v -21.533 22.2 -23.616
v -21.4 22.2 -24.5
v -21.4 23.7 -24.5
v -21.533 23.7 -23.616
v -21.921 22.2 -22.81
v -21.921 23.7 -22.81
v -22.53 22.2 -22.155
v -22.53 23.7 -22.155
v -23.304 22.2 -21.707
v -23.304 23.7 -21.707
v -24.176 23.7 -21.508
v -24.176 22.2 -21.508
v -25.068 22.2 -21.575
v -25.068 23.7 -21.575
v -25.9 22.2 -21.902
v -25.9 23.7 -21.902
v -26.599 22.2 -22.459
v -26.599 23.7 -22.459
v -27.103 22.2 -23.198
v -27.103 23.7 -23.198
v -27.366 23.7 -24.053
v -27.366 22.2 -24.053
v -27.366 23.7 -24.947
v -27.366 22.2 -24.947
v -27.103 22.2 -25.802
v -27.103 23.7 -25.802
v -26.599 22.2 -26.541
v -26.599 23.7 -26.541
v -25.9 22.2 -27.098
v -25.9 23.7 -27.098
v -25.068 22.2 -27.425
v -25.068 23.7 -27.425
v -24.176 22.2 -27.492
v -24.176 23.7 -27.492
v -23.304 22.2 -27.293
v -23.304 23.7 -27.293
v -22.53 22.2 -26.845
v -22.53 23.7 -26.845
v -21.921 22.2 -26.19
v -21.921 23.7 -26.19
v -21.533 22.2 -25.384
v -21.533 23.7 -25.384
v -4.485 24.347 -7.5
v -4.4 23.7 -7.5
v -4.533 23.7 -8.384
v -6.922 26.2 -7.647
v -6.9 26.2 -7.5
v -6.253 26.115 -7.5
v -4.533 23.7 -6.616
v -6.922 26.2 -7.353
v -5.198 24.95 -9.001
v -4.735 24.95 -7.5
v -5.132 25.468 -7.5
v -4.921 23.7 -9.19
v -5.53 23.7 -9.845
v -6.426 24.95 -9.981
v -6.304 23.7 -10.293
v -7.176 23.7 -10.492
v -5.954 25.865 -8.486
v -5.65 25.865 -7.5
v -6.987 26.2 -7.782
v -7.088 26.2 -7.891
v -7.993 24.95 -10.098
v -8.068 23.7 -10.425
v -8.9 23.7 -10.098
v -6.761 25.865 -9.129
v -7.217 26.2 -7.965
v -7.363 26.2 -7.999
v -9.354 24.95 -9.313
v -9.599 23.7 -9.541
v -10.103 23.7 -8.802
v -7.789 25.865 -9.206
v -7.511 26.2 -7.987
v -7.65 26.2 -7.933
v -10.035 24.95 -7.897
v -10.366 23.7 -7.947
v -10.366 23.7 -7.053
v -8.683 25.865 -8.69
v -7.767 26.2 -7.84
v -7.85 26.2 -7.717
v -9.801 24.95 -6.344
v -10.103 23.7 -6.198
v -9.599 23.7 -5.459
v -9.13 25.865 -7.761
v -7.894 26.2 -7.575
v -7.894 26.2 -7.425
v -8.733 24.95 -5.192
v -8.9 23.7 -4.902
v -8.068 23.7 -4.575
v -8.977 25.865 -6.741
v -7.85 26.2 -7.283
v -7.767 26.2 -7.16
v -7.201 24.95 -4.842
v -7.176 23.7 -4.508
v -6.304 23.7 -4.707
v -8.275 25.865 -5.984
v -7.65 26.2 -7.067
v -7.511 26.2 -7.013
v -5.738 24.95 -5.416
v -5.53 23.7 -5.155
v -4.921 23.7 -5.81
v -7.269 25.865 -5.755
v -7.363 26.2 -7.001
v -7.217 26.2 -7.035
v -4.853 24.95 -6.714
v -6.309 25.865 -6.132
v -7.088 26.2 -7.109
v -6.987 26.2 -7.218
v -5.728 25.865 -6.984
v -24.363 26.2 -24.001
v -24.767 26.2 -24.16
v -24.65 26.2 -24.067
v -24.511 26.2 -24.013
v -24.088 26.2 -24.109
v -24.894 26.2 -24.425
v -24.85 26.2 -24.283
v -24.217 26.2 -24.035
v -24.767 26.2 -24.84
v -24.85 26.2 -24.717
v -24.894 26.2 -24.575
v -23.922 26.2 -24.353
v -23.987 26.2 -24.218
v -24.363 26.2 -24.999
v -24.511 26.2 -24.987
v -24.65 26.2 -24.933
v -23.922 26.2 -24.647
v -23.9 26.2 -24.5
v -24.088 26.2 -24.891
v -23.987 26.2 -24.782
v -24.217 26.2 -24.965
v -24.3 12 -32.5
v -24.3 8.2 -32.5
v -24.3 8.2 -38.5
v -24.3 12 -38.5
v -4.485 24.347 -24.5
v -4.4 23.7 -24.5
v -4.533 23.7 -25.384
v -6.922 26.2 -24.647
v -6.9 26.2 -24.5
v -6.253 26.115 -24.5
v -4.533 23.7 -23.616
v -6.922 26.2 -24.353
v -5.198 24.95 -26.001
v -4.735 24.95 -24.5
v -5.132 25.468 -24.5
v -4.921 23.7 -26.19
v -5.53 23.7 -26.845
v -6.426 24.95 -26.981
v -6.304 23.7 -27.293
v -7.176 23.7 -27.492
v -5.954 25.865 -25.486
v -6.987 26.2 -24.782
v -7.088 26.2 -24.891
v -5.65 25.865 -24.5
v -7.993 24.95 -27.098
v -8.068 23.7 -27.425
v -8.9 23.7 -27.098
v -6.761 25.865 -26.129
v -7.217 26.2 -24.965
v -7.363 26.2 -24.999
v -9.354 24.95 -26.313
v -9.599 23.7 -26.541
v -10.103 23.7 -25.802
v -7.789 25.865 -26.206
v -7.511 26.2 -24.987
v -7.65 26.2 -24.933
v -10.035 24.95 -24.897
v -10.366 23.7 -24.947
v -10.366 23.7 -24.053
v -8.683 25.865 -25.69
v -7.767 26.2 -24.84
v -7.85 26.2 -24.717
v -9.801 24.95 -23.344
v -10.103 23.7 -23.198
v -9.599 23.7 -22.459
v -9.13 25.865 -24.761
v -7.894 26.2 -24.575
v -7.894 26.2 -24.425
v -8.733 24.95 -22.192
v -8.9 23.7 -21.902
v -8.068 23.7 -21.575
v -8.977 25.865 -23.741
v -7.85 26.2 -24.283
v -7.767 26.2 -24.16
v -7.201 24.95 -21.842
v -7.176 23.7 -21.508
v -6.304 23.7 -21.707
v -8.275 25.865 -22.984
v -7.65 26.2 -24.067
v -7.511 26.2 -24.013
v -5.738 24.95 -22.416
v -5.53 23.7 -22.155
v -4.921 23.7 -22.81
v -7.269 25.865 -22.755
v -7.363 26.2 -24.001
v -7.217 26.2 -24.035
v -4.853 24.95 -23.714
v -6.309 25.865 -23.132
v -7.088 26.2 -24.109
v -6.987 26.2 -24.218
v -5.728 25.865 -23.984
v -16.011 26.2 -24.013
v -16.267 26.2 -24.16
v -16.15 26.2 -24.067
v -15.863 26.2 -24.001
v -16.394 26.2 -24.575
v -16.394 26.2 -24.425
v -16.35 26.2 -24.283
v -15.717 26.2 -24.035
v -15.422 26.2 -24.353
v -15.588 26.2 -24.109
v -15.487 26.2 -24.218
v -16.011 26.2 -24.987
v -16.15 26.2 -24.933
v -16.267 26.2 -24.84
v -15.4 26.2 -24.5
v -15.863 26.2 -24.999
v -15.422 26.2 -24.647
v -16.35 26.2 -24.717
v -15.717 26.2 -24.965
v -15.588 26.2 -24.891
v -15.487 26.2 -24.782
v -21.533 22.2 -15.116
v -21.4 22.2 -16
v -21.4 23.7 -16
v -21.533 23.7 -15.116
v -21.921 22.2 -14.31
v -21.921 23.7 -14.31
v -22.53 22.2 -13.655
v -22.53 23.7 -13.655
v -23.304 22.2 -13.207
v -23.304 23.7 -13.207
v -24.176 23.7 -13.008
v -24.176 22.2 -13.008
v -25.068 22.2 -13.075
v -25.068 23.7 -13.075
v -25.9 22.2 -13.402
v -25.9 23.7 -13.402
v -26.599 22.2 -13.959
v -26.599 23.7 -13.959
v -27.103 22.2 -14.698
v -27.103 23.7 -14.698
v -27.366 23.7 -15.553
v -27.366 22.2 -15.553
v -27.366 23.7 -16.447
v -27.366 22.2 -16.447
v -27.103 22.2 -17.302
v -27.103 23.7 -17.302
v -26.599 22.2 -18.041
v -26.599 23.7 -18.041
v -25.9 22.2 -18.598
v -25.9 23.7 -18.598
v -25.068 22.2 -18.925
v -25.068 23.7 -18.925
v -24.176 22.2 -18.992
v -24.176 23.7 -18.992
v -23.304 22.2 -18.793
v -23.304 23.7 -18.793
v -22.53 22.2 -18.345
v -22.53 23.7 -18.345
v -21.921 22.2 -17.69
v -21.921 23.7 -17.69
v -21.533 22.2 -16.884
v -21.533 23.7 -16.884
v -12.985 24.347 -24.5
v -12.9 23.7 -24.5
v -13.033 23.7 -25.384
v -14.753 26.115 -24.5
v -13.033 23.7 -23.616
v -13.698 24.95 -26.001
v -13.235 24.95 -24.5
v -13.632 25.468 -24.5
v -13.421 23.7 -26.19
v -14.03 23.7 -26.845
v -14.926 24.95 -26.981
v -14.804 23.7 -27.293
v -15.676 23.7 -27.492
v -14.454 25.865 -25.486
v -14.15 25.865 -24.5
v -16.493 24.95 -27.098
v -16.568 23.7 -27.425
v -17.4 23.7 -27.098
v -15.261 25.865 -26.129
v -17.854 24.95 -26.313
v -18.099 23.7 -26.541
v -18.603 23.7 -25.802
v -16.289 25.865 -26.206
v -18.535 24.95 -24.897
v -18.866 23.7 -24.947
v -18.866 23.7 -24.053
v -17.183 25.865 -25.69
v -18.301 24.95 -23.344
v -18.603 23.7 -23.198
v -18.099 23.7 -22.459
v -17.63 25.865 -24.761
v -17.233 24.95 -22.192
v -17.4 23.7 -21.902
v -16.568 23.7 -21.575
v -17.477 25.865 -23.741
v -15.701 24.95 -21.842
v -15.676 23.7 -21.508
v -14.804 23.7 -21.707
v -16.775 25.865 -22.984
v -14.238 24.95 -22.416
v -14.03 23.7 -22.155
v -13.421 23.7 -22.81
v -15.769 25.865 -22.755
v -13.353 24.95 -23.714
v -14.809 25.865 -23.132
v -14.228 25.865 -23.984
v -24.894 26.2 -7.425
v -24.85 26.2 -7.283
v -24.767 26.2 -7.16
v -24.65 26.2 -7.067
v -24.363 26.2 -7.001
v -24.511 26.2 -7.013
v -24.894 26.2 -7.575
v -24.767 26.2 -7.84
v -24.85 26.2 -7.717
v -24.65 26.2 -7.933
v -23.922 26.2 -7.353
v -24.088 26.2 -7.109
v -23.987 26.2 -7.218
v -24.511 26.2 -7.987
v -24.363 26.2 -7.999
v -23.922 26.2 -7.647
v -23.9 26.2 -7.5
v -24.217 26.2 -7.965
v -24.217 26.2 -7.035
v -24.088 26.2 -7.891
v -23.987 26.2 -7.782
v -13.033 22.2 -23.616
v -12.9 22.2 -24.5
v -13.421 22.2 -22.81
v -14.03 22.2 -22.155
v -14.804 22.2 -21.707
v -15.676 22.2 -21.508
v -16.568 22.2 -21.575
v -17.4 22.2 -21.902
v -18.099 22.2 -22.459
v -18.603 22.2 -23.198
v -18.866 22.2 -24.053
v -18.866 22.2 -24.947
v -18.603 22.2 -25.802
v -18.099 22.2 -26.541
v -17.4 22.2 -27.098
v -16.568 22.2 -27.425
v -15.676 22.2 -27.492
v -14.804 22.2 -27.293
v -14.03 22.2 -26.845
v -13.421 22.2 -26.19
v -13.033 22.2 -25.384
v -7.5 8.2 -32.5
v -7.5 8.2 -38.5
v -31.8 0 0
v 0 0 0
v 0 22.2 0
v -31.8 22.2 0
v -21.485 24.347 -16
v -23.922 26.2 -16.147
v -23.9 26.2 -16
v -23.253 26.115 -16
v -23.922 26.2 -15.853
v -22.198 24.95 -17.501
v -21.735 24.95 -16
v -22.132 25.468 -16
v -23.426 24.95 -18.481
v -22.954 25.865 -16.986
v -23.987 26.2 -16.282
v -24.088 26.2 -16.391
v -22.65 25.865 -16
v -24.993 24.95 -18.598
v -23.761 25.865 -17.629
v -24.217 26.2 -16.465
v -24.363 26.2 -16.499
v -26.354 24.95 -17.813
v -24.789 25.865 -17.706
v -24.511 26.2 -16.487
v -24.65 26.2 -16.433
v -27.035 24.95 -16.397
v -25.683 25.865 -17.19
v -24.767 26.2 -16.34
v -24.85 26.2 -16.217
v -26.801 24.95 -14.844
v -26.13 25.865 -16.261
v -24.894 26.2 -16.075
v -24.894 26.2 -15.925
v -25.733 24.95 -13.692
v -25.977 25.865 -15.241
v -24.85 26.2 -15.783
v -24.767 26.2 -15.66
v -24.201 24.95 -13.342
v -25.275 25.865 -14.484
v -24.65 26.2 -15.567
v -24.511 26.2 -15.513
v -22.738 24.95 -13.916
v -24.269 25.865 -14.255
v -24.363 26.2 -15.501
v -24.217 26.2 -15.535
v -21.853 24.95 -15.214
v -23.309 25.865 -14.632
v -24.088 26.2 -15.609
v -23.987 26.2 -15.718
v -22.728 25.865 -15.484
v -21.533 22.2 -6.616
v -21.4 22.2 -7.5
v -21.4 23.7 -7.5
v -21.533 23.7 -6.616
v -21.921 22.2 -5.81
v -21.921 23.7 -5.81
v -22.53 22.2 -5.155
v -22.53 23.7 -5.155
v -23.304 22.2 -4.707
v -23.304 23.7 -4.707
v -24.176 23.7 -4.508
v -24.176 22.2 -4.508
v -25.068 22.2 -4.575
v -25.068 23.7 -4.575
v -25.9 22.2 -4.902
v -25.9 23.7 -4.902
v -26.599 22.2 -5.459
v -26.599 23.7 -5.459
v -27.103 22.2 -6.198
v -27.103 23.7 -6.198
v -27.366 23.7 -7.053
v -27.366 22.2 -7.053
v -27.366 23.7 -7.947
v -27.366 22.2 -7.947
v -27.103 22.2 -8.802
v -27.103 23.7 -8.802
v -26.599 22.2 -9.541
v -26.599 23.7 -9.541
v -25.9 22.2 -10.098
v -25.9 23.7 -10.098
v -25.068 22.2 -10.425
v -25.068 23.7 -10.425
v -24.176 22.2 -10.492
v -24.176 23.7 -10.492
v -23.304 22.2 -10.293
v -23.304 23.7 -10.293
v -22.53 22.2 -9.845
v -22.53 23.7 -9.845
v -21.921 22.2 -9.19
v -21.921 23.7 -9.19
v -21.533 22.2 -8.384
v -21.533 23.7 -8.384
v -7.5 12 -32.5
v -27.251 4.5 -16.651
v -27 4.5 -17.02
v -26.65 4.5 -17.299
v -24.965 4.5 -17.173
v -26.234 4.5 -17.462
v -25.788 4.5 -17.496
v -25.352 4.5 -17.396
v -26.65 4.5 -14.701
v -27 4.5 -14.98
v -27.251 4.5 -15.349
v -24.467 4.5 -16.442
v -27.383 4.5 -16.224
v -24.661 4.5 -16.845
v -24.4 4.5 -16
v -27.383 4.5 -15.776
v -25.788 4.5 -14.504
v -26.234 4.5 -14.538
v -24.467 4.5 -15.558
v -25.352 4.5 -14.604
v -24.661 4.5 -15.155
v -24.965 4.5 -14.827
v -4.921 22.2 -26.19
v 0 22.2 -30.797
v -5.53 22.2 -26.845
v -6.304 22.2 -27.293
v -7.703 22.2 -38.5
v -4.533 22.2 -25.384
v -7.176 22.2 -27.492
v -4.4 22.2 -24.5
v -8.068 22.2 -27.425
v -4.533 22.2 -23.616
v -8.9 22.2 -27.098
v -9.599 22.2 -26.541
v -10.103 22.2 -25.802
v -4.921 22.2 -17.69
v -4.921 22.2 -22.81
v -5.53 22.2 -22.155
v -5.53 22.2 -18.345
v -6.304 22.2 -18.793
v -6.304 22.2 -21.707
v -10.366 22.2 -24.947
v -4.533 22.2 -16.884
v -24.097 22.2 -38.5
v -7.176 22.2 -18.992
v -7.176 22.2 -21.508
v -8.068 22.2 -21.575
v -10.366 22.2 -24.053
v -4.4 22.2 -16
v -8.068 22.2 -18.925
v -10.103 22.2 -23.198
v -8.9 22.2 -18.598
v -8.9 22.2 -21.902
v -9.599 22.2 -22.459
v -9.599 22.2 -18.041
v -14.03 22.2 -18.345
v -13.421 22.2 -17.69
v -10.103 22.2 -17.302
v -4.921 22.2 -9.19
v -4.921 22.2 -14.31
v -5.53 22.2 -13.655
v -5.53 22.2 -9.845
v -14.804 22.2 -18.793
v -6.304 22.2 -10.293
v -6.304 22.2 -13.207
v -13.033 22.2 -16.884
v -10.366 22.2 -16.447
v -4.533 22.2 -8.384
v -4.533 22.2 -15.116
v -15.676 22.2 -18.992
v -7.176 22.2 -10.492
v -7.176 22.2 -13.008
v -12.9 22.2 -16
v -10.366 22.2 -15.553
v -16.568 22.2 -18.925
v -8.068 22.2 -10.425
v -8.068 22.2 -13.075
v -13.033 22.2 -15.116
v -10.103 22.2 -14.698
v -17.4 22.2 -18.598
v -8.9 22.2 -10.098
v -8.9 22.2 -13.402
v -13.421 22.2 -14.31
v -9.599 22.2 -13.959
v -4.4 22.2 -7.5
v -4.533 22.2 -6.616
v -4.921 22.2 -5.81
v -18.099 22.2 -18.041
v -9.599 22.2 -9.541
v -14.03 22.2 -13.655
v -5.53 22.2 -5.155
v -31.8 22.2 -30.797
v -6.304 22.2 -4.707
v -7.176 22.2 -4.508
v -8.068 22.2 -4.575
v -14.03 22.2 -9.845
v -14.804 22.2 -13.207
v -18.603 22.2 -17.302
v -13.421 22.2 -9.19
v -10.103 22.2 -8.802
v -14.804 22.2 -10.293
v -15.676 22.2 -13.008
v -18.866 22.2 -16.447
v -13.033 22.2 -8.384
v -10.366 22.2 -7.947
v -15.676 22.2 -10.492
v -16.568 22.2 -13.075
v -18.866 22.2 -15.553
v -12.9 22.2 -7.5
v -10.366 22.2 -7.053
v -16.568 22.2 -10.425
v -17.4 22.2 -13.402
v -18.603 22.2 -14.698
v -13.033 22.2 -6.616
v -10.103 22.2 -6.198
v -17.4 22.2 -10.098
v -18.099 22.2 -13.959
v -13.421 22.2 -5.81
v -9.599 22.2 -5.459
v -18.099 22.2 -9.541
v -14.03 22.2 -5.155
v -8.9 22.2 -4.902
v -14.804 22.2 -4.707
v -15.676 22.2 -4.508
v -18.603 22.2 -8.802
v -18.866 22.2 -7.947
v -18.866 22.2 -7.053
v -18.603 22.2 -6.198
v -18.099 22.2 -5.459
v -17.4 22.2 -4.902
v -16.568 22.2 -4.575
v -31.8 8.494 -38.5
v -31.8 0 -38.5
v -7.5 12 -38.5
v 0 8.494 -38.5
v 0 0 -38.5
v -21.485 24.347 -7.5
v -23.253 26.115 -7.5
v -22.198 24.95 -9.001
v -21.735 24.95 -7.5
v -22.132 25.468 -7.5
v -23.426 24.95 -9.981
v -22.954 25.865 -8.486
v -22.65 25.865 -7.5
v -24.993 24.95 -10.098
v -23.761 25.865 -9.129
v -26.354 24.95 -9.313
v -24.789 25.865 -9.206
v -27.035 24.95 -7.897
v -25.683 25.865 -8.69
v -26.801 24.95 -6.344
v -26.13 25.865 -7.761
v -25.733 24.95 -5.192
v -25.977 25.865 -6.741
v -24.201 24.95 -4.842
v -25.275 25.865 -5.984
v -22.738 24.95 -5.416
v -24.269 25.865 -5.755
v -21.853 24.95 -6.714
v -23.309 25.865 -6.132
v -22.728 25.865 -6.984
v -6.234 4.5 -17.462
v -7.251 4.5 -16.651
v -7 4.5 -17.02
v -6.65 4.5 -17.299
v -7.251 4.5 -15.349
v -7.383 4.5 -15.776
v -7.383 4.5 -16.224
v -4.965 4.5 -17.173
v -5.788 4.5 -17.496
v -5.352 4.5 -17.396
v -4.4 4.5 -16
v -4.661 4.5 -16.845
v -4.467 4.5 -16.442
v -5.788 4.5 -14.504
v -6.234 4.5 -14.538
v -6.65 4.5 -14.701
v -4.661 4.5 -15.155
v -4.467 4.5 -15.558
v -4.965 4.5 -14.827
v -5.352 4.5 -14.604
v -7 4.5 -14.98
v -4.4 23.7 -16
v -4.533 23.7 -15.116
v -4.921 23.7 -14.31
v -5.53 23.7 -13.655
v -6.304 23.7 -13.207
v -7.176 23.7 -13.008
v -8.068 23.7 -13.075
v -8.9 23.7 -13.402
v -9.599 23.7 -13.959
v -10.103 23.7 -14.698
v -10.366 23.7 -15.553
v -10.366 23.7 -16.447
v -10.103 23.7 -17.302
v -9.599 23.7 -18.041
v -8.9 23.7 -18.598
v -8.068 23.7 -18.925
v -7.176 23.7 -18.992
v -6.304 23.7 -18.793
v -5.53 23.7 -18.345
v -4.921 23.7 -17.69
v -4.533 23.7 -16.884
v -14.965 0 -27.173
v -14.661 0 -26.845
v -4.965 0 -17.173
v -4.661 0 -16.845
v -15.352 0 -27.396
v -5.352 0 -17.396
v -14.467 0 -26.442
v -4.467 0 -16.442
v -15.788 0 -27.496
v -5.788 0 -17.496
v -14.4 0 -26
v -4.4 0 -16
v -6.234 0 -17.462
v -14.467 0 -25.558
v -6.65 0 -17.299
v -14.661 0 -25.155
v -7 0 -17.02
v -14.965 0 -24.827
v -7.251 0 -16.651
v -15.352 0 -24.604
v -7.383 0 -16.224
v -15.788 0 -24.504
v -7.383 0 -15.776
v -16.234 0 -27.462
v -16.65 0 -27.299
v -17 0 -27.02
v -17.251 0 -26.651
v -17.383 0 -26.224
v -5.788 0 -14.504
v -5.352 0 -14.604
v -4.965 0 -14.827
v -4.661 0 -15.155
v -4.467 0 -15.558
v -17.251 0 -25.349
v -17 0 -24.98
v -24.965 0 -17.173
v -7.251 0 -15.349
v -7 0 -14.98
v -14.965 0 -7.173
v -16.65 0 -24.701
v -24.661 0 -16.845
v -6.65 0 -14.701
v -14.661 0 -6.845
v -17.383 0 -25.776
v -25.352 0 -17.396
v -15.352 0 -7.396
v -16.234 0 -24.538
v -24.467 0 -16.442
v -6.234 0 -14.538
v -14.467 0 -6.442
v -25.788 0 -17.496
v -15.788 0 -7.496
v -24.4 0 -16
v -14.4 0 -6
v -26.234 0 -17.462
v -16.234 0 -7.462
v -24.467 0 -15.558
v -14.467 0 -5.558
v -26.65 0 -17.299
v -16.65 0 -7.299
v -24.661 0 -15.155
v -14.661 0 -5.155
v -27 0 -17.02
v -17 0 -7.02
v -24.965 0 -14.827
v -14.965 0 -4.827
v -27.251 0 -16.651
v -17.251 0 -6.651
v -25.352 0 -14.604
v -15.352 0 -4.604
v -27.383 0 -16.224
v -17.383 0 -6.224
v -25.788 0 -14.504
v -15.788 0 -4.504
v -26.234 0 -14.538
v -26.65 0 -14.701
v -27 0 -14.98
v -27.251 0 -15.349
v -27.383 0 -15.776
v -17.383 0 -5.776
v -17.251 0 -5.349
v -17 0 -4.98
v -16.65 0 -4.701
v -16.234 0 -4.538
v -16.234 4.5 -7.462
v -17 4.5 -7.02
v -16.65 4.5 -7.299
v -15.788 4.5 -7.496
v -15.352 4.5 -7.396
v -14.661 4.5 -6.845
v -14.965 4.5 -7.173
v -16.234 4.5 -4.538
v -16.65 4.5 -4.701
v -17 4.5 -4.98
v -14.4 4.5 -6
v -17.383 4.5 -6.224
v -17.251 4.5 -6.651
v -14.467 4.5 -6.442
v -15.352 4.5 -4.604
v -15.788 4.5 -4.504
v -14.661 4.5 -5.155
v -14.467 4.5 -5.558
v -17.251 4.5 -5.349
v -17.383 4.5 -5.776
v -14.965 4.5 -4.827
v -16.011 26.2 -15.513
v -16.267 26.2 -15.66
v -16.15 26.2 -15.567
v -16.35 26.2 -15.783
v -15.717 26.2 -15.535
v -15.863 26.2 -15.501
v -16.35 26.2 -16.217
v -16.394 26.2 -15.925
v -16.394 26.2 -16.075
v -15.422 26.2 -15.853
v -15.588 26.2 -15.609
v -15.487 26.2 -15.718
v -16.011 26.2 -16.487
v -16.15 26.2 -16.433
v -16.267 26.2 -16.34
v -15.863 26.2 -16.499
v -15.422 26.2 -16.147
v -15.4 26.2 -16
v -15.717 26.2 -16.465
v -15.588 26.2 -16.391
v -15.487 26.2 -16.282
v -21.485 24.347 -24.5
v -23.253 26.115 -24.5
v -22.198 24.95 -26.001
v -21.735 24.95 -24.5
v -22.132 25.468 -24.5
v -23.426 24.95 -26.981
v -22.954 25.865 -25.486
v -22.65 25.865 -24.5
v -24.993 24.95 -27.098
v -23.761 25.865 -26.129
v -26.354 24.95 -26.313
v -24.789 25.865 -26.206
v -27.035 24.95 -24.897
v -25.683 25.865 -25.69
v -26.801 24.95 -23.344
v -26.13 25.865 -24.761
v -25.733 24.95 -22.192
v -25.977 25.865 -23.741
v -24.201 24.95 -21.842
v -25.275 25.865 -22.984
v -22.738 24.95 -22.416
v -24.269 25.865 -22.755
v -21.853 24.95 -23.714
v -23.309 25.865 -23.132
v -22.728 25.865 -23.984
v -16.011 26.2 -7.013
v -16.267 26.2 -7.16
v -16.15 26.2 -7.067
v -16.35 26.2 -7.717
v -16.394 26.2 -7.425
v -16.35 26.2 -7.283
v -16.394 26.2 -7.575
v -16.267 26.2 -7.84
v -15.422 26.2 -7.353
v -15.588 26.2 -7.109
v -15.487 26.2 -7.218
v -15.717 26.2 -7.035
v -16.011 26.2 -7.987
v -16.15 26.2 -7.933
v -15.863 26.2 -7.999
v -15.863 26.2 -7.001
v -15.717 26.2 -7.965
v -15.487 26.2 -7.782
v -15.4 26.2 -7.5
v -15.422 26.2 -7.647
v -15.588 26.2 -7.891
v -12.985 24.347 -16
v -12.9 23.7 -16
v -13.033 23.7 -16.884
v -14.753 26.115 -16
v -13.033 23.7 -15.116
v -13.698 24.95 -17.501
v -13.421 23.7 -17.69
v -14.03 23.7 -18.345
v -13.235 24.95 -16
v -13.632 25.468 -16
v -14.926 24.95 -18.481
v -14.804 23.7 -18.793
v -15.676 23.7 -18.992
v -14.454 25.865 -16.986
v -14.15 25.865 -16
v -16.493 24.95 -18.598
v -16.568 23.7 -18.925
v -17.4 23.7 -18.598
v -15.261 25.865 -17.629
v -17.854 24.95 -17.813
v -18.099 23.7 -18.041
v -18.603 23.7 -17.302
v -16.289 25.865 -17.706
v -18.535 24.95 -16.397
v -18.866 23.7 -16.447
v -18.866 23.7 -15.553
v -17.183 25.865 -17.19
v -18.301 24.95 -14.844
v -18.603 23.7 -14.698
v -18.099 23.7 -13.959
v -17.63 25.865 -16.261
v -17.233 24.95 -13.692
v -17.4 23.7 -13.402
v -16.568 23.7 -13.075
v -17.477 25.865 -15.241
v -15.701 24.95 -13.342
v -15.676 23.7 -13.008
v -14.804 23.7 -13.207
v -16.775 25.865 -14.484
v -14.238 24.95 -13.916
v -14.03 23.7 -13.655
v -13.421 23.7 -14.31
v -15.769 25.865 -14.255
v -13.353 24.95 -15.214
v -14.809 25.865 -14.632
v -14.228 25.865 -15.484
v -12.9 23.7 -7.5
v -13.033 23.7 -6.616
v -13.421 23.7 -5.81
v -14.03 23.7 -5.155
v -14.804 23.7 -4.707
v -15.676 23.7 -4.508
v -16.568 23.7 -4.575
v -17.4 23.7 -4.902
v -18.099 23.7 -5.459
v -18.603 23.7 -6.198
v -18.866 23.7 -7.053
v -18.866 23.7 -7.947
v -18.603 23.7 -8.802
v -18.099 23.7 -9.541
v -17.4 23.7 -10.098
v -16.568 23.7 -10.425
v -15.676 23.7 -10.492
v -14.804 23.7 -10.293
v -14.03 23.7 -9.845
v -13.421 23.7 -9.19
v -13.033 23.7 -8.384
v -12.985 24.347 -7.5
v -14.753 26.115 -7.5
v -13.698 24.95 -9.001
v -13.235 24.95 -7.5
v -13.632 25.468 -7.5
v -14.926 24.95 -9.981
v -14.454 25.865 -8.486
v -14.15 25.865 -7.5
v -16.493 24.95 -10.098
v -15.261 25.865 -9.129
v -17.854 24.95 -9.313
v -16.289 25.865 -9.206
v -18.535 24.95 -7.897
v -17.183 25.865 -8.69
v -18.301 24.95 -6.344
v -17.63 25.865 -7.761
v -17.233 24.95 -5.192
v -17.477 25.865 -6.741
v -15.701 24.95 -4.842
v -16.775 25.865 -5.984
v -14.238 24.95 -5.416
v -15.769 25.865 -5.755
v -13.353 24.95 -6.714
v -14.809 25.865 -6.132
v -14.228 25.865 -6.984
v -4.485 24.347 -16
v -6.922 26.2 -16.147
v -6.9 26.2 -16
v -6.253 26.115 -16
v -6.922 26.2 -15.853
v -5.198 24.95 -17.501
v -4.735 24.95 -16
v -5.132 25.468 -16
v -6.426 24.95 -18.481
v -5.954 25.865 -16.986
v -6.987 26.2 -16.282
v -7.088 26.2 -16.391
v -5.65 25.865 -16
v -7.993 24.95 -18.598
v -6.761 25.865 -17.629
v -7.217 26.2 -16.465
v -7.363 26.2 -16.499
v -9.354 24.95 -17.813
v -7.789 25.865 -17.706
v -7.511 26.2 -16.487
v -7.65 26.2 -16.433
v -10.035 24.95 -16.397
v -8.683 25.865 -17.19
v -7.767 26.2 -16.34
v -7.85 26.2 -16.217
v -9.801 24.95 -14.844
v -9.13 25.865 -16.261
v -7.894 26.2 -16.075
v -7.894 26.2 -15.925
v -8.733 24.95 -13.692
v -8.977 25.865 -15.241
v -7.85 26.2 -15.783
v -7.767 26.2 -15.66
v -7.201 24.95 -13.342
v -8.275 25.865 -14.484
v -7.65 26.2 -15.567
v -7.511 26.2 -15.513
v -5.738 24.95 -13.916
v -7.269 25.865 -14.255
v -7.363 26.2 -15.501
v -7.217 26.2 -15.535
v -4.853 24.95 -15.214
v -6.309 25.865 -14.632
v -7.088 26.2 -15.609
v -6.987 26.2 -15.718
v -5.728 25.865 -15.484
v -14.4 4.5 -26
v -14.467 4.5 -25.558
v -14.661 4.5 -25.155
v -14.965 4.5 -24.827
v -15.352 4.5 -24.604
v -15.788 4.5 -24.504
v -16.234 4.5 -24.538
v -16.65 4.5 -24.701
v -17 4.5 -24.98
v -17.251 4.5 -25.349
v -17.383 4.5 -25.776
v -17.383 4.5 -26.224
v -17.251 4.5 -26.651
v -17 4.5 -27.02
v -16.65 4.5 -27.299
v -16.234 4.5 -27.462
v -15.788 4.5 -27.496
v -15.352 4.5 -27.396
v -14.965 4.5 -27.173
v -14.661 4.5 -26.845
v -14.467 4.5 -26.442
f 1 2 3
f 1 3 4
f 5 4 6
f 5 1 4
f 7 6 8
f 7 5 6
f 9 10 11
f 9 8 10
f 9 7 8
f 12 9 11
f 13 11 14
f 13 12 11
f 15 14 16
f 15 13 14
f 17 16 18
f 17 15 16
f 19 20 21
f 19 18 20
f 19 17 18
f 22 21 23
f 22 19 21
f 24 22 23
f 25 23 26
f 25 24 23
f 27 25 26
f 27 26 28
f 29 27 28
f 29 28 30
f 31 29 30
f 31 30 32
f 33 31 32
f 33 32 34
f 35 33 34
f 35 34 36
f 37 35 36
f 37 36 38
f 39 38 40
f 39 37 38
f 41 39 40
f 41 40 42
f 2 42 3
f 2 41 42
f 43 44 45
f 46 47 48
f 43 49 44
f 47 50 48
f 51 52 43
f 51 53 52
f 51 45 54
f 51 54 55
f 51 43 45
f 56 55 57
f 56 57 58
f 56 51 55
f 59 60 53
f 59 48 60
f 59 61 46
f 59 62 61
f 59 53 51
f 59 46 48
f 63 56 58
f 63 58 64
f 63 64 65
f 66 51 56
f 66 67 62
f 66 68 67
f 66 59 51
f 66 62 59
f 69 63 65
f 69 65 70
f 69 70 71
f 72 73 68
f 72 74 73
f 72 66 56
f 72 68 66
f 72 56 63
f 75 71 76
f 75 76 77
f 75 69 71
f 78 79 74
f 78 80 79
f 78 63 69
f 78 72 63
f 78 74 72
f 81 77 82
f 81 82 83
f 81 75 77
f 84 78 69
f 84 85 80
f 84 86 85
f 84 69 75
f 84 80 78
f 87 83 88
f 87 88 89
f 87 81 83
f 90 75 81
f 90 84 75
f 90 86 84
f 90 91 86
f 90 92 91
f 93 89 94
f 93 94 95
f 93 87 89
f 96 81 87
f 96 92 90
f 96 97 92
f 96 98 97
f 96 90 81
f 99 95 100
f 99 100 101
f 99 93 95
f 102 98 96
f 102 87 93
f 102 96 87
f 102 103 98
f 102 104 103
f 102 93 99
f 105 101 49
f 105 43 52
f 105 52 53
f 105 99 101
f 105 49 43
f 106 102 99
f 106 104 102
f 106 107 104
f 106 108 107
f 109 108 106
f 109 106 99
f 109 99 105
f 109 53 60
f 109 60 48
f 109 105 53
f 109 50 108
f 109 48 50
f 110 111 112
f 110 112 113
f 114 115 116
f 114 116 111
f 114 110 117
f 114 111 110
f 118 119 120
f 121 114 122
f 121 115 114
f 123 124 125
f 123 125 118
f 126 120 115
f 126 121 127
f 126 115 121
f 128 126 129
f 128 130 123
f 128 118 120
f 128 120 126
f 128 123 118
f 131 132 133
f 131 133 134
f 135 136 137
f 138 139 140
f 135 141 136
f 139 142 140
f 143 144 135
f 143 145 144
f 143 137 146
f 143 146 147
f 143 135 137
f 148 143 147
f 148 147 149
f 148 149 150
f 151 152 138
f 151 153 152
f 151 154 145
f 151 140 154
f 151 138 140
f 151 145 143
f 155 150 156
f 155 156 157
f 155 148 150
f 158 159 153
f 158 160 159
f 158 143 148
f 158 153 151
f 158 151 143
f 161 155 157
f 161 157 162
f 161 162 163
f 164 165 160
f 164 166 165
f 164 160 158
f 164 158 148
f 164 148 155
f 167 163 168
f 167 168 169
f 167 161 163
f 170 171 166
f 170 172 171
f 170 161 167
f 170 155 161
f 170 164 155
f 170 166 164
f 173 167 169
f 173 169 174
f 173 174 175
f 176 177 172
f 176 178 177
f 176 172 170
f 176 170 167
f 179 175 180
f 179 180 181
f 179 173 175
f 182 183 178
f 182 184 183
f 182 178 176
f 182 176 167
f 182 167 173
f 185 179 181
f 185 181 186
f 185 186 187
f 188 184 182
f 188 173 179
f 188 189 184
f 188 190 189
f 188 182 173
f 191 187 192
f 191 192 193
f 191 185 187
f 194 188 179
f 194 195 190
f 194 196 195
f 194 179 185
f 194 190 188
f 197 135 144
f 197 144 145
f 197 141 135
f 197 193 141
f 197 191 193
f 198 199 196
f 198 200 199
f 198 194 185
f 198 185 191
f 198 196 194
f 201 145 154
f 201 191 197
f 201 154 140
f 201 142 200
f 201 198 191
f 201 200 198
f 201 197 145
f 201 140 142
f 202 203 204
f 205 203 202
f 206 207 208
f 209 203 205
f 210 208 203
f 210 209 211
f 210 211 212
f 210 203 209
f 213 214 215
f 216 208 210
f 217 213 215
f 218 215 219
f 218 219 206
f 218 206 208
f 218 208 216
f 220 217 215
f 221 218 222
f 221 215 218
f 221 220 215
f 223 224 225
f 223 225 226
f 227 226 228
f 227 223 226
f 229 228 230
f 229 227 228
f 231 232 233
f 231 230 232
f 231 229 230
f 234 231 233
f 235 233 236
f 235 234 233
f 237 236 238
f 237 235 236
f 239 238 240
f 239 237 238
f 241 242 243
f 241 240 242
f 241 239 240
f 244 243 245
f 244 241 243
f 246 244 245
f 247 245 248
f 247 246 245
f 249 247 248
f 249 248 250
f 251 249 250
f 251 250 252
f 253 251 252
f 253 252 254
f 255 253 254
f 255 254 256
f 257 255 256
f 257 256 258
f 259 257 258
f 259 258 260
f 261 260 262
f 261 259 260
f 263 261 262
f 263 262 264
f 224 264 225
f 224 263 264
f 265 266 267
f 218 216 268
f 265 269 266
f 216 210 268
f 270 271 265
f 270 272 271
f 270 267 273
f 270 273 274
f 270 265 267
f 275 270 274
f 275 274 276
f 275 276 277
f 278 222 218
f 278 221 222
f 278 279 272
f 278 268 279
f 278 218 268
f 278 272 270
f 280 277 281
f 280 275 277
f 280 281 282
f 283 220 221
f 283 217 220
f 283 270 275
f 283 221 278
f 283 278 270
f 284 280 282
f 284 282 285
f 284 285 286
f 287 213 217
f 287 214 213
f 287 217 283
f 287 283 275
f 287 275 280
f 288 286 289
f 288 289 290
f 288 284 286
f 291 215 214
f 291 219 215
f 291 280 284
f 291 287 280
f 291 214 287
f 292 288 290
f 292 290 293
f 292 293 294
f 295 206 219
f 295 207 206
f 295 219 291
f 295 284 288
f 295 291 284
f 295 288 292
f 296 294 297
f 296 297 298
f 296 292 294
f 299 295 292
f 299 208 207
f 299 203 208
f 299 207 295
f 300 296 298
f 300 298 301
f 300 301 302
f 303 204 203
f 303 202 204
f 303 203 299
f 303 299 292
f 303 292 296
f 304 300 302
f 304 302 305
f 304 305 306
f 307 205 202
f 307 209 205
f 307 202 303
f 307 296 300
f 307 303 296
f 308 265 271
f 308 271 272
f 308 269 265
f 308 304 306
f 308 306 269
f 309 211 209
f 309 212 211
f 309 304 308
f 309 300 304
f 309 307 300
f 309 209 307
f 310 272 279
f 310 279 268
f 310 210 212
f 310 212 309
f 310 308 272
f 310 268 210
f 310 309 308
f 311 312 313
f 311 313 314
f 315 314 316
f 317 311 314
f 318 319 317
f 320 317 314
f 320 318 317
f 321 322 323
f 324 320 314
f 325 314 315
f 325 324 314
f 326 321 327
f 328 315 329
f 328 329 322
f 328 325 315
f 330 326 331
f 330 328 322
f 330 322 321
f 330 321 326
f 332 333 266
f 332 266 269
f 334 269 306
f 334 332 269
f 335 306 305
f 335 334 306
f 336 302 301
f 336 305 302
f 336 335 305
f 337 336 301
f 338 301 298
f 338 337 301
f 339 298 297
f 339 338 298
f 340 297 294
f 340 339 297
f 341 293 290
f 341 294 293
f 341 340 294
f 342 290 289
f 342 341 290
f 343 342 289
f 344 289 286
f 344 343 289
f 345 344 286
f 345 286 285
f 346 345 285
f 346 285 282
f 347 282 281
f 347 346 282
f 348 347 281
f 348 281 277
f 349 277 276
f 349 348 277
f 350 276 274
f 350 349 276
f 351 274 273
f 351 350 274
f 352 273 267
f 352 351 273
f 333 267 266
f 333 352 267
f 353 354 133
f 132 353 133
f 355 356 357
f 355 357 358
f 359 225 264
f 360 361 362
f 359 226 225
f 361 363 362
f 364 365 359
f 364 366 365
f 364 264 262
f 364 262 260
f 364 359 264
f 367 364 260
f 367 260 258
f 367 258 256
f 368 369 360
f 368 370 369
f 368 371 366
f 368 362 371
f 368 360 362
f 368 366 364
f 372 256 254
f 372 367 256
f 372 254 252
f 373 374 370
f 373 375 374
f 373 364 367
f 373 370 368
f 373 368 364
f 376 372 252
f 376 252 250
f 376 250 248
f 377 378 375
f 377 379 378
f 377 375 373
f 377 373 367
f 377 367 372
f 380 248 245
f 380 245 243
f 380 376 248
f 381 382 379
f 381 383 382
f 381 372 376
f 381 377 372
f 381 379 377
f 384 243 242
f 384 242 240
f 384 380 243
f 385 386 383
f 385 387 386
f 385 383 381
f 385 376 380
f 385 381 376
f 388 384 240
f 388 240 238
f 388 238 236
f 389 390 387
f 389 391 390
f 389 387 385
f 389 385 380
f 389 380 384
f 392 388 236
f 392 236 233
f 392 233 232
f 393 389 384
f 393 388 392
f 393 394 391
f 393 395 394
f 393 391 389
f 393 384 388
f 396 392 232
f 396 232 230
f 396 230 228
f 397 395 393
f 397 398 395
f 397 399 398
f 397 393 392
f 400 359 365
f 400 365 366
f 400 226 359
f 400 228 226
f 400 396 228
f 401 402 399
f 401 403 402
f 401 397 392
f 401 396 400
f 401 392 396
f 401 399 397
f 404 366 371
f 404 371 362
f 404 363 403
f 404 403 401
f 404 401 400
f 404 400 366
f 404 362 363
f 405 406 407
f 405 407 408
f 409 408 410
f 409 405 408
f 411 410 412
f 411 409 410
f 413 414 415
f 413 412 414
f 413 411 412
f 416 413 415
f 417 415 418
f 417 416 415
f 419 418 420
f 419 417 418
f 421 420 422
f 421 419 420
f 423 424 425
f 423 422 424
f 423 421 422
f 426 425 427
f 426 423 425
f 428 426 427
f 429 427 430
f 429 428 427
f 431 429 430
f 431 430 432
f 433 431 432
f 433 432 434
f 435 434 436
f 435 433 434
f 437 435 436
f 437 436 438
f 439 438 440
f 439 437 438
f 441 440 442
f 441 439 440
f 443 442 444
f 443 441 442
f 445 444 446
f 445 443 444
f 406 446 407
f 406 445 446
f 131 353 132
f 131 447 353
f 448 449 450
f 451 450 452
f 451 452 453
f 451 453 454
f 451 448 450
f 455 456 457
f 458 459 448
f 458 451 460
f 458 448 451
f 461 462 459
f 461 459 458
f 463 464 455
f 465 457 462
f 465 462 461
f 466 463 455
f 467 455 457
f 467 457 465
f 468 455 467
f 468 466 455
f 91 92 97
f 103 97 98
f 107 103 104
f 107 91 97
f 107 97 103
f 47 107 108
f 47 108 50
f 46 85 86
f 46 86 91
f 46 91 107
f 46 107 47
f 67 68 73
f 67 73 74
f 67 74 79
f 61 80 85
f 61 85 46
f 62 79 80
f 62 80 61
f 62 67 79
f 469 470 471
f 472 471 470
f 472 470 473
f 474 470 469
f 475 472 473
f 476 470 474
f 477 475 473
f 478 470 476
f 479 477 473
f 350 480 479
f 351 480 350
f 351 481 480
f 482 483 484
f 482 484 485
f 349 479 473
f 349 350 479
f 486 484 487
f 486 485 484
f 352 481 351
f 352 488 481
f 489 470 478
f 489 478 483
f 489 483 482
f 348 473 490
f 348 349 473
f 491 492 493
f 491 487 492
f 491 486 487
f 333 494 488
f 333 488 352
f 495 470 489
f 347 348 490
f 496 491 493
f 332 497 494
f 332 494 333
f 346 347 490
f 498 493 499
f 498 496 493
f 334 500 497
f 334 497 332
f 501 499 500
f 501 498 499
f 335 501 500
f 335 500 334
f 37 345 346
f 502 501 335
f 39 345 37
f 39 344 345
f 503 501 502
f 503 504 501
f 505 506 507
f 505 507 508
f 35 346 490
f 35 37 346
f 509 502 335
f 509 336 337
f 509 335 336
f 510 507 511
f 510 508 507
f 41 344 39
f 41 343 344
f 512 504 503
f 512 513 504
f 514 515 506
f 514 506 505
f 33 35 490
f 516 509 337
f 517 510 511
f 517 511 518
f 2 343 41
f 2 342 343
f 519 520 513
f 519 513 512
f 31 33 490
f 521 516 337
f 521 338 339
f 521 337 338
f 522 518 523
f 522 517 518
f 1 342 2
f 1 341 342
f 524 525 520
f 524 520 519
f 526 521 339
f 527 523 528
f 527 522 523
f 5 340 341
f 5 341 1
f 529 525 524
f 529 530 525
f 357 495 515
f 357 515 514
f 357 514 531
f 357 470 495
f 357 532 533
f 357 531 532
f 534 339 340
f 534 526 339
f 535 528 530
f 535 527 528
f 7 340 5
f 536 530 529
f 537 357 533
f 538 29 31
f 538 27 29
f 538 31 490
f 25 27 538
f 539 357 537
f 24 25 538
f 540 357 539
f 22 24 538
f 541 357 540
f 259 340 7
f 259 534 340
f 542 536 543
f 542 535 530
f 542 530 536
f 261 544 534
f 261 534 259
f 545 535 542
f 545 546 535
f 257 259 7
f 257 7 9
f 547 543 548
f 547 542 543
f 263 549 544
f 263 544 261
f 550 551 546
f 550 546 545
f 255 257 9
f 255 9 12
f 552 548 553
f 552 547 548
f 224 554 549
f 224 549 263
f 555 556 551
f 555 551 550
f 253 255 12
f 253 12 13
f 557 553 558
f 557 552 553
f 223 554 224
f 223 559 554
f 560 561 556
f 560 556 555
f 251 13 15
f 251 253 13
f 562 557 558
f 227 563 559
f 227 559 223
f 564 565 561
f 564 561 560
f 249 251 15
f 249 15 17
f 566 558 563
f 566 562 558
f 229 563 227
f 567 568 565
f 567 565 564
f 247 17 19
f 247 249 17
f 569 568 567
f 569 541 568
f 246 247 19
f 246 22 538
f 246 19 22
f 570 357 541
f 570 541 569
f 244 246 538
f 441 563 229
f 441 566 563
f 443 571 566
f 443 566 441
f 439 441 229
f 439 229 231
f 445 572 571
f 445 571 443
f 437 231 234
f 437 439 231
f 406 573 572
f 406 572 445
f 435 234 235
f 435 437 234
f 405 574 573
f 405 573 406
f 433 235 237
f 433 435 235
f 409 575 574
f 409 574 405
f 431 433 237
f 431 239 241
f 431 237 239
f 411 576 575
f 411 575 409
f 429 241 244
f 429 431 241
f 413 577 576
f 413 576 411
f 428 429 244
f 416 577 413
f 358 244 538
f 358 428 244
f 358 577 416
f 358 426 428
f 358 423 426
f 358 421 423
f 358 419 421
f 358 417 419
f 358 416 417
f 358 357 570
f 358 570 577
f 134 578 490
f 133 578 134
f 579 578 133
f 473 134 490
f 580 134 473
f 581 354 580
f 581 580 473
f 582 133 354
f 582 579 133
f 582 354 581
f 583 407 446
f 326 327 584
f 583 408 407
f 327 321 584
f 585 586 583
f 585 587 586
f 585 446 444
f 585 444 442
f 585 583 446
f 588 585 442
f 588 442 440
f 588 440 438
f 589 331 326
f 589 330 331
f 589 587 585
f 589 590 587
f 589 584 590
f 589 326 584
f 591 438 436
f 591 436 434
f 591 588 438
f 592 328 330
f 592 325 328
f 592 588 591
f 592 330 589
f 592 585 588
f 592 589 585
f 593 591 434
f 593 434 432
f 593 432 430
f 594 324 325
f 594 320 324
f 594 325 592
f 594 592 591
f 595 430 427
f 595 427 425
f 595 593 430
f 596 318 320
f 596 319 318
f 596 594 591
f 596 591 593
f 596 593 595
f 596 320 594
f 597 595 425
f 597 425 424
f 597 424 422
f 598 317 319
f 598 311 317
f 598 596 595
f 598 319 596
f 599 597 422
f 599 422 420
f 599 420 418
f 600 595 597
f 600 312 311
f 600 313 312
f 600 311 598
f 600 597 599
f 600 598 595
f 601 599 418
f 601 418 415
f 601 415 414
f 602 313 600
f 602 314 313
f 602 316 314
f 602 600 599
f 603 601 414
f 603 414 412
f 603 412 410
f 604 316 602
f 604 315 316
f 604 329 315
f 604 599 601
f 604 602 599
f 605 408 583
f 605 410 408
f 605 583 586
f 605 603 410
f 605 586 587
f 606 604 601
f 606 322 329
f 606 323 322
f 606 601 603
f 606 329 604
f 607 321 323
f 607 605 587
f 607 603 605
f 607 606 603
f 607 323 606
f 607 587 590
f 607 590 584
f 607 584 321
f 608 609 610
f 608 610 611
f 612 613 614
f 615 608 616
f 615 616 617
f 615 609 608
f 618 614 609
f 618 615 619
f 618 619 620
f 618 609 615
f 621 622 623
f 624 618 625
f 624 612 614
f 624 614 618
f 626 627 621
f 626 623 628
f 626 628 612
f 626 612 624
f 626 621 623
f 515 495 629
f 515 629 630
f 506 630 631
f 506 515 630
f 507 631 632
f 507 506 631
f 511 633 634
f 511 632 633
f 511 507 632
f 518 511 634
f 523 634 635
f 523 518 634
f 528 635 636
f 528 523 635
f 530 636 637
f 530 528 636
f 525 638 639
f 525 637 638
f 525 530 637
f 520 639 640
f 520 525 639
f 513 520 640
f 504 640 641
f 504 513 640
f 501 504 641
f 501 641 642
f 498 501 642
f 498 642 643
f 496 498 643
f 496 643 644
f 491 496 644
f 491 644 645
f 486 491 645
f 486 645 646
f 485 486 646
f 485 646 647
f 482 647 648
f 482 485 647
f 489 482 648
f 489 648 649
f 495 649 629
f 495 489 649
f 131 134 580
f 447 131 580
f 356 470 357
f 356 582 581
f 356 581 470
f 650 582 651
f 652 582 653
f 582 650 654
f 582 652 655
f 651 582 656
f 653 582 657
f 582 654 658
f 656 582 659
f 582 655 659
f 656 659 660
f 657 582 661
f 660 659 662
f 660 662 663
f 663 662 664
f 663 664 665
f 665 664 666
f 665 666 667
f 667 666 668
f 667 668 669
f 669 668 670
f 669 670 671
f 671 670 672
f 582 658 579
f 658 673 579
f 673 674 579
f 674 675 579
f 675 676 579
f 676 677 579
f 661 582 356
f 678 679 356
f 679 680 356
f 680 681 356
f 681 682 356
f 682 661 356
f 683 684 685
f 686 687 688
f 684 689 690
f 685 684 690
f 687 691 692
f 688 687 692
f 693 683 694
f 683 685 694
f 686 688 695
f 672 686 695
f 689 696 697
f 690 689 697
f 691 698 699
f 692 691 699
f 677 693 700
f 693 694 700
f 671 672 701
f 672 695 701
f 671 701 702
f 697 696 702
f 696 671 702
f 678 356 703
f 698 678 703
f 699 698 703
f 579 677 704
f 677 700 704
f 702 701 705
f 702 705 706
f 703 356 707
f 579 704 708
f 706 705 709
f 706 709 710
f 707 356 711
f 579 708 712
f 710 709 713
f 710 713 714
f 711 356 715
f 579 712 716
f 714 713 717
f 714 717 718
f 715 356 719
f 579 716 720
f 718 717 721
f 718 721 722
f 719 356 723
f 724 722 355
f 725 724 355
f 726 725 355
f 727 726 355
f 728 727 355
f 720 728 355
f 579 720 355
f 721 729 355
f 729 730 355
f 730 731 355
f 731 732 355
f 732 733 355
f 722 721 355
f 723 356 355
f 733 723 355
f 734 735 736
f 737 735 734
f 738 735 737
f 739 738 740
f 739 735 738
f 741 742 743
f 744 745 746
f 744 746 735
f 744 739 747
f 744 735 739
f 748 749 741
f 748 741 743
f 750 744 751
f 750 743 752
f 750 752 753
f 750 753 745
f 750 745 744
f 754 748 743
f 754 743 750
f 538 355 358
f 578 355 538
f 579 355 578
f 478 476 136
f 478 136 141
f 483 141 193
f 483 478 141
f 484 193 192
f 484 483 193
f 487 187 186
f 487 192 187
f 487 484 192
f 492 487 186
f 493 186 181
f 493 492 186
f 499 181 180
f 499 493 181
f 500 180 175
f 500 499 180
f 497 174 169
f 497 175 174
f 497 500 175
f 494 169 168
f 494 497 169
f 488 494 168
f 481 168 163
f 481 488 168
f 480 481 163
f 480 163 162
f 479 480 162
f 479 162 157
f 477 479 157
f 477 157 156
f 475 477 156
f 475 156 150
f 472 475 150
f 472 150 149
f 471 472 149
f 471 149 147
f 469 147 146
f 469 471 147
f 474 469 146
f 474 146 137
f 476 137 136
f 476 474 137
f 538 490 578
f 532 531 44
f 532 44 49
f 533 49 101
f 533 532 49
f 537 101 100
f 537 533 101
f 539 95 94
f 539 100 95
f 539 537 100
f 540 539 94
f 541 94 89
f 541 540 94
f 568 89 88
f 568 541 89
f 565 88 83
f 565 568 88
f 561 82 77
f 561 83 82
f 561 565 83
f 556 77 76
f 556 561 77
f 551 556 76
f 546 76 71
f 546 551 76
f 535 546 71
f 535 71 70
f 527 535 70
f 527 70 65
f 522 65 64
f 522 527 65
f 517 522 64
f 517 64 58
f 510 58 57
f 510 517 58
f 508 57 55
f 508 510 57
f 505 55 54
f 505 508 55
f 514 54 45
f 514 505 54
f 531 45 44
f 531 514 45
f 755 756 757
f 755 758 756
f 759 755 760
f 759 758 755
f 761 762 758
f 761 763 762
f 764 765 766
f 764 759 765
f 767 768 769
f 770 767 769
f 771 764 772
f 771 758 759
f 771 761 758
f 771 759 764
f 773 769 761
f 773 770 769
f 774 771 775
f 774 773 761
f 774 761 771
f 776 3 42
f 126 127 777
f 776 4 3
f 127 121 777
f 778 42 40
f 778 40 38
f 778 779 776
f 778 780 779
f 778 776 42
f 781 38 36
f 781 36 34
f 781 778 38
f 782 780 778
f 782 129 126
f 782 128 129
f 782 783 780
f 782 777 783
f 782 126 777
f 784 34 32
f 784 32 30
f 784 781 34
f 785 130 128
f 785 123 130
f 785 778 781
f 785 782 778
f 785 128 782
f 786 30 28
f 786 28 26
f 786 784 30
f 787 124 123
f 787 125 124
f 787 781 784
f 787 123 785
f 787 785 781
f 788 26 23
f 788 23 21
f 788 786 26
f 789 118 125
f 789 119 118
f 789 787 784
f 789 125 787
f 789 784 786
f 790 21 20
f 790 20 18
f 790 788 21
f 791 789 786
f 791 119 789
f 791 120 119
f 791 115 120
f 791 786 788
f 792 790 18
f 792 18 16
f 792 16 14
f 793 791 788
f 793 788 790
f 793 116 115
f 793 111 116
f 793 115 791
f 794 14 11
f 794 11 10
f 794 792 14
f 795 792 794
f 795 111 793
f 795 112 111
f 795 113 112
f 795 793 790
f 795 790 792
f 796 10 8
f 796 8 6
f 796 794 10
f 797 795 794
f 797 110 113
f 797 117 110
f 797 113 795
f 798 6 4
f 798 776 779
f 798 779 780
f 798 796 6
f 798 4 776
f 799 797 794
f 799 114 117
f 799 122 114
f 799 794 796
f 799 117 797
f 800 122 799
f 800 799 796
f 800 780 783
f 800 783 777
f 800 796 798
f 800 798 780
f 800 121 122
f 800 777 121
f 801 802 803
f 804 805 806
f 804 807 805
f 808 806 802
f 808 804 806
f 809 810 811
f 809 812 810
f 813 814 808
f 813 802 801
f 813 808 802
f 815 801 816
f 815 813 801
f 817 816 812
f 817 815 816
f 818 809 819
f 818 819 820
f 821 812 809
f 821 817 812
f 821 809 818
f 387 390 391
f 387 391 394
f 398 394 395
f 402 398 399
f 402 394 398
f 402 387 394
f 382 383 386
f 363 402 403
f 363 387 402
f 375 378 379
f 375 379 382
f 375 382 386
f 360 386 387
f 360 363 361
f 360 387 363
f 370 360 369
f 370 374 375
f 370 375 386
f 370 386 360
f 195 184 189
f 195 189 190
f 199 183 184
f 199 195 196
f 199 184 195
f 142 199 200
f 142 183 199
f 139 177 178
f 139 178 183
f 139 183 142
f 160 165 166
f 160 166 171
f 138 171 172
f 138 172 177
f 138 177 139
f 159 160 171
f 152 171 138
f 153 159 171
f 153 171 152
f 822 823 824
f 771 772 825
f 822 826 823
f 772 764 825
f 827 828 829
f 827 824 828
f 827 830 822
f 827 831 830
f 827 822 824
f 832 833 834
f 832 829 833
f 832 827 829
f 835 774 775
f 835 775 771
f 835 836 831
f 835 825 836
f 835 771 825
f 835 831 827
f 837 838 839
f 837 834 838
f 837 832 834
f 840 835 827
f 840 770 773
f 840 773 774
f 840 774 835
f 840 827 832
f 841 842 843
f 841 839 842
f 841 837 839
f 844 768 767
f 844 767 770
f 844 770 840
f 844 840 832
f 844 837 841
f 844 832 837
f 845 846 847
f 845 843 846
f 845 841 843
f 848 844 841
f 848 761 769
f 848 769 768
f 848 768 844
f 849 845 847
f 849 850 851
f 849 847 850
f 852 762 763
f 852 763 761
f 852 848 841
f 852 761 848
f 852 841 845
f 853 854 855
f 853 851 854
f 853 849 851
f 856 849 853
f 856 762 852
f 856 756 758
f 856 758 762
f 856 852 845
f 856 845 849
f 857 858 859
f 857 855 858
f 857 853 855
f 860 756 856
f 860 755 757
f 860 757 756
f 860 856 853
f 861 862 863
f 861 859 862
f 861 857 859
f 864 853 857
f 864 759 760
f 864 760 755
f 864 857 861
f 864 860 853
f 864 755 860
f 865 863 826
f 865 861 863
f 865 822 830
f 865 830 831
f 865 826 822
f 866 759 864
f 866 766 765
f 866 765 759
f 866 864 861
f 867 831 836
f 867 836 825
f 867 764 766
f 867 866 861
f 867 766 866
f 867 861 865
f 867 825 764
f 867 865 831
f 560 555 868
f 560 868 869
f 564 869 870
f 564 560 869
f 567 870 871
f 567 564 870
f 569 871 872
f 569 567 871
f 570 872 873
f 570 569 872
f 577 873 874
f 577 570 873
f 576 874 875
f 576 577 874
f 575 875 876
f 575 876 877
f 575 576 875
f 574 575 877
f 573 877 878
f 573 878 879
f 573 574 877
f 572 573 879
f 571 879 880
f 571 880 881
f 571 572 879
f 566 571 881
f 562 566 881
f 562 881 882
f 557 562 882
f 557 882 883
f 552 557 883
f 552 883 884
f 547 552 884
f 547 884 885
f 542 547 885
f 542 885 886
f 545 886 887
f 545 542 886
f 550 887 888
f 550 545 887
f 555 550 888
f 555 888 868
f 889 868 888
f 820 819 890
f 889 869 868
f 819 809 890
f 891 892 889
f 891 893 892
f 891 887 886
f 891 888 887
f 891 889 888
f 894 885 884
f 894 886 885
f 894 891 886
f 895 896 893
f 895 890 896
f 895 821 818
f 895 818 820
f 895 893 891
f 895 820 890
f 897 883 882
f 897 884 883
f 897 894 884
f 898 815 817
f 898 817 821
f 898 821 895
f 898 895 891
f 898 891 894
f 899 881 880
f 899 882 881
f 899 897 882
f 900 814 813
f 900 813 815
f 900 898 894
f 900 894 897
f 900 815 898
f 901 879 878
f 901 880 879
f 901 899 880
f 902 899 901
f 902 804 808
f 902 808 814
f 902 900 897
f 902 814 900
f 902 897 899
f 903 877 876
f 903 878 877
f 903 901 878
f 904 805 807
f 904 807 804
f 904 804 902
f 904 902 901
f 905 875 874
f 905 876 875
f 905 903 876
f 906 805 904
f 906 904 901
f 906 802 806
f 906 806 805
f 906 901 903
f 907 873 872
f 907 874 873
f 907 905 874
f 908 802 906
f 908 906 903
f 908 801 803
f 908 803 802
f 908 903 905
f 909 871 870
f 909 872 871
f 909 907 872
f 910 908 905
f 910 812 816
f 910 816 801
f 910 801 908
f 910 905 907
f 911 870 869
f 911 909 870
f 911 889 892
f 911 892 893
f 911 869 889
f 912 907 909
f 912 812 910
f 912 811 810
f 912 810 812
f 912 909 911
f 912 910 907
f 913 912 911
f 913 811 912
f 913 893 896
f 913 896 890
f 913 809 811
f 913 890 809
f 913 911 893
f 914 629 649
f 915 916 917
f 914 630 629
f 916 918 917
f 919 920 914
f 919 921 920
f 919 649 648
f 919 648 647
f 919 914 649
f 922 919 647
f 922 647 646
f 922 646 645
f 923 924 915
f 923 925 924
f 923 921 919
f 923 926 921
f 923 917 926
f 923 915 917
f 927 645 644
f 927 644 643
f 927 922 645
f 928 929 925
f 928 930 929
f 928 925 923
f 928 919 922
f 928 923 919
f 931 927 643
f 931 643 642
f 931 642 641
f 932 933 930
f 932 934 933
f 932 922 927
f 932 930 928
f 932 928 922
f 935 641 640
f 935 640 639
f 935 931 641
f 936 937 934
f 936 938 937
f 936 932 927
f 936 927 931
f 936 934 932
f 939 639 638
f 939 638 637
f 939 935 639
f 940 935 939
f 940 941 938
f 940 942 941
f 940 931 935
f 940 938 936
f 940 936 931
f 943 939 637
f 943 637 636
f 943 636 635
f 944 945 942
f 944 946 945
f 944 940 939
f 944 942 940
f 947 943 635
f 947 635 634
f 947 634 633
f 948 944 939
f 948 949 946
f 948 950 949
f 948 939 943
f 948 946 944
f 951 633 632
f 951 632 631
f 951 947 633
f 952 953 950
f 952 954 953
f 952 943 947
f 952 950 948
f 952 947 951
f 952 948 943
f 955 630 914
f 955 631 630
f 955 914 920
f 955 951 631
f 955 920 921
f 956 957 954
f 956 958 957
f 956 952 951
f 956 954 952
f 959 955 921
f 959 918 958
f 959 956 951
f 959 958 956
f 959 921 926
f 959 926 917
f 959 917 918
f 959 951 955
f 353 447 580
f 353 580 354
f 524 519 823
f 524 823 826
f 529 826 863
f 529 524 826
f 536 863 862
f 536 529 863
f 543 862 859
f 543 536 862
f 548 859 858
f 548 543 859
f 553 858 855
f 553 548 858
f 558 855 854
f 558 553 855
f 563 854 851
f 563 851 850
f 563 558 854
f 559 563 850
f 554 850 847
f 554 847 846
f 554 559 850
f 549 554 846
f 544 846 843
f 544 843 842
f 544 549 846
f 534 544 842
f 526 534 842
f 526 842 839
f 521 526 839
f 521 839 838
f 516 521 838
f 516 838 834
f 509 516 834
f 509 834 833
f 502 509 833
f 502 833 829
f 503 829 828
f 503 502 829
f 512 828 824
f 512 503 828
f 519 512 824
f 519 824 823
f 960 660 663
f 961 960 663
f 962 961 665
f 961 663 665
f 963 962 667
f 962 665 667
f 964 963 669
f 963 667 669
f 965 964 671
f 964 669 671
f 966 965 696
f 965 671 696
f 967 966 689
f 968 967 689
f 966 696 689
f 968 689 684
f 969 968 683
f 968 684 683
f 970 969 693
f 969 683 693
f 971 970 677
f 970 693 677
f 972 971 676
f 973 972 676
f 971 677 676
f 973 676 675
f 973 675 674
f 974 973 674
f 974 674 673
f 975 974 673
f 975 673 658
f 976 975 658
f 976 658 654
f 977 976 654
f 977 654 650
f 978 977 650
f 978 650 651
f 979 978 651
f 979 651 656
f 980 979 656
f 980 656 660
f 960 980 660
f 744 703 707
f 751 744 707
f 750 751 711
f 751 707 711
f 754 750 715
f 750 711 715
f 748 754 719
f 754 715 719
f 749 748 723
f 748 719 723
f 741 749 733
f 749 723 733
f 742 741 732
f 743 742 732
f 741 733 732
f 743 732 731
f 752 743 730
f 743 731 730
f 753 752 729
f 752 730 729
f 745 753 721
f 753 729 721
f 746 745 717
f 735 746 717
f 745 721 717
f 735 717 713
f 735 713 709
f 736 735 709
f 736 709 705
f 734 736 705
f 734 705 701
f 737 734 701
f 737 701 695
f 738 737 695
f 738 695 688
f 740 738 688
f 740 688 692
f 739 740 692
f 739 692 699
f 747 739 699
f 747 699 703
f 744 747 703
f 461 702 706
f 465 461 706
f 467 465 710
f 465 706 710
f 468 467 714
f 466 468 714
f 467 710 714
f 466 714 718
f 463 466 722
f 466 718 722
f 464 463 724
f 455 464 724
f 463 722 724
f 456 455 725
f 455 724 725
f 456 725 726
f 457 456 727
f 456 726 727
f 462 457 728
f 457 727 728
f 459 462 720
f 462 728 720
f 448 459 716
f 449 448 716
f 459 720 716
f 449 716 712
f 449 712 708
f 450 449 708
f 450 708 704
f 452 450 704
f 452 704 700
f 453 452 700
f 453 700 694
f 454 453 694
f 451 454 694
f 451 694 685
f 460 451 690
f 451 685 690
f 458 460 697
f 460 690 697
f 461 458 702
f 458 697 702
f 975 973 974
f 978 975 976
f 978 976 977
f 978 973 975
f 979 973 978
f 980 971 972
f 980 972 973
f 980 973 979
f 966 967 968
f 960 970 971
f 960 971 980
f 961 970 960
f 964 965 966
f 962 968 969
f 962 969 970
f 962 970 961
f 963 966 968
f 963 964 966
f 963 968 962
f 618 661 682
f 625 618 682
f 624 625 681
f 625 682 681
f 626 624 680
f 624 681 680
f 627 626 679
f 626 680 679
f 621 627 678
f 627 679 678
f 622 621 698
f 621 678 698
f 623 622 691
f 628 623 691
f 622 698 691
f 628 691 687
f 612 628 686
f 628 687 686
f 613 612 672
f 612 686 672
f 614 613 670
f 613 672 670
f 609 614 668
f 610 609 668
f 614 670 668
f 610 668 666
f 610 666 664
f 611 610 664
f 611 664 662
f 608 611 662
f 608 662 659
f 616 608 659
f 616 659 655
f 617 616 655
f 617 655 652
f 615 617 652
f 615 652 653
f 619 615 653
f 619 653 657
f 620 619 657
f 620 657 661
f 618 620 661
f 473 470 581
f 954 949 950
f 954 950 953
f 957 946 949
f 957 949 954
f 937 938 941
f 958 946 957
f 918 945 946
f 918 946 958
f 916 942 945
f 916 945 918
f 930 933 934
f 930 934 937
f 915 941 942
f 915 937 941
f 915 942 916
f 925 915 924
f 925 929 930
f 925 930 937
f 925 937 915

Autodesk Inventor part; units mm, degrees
ref_plane "YZ Plane" through (0, 0, 0) normal (1, 0, 0) x (0, 1, 0)
sketch "Sketch1" plane through (0, 0, 0) normal (0, 1, 0) x (-1, 0, 0)
  line L0 (0, 0) -> (31.8, 0)
  line L1 (31.8, 0) -> (31.8, -38.5)
  line L2 (31.8, -38.5) -> (0, -38.5)
  line L3 (0, -38.5) -> (0, 0)
  dimension "d0" = 31.8
  dimension "d1" = 38.5
extrude "Extrusion1" add sketch "Sketch1" along normal blind 22.2
sketch "Sketch2" plane through (0, 0, 0) normal (0, -1, 0) x (1, 0, 0)
  line L0 (-31.8, 0) -> (0, 0) projected
  line L1 (-15.9, 0) -> (-15.9, -1.476)
  line L2 (-15.9, 0) -> (-15.9, -16)
  line L3 (-15.9, -16) -> (-5.9, -16)
  line L4 (-5.9, -16) -> (-25.9, -16)
  line L5 (-15.9, -16) -> (-15.9, -26)
  line L6 (-15.9, -26) -> (-15.9, -6)
  circle A0 centre (-15.9, -6) radius 1.5
  circle A1 centre (-5.9, -16) radius 1.5
  circle A2 centre (-15.9, -26) radius 1.5
  circle A3 centre (-25.9, -16) radius 1.5
  dimension "d4" = 16
  dimension "d5" = 10
  dimension "d6" = 20
  dimension "d7" = 10
  dimension "d8" = 20
  dimension "d9" = 3
  dimension "d10" = 3
  dimension "d11" = 3
  dimension "d12" = 3
extrude "Extrusion2" cut sketch "Sketch2" against normal blind 4.5
sketch "Sketch3" plane through (0, 22.2, 0) normal (0, 1, 0) x (1, 0, 0)
  line L0 (-31.8, 0) -> (0, 0) projected
  line L1 (-15.9, 0) -> (-15.9, 16)
  circle A0 centre (-15.9, 16) radius 3
  circle A1 centre (-7.4, 16) radius 3
  circle A2 centre (-24.4, 16) radius 3
  circle A3 centre (-7.4, 7.5) radius 3
  circle A4 centre (-15.9, 7.5) radius 3
  circle A5 centre (-24.4, 7.5) radius 3
  circle A6 centre (-7.4, 24.5) radius 3
  circle A7 centre (-15.9, 24.5) radius 3
  circle A8 centre (-24.4, 24.5) radius 3
  dimension "d15" = 16
  dimension "d16" = 6
  dimension "d19" = 8.5
  dimension "d26" = 8.5
  dimension "d33" = 8.5
  dimension "d40" = 8.5
extrude "Extrusion3" add sketch "Sketch3" along normal blind 4
fillet "Fillet1" radius 2.5 9 edges at (-10.4, 26.2, -7.5) (-18.9, 26.2, -7.5) (-27.4, 26.2, -7.5) (-27.4, 26.2, -16) (-18.9, 26.2, -16) (-10.4, 26.2, -16) (-10.4, 26.2, -24.5) (-18.9, 26.2, -24.5) (-27.4, 26.2, -24.5)
sketch "Sketch4" plane through (0, 0, -38.5) normal (0, 0, -1) x (-1, 0, 0)
  line L0 (17.4, 0) -> (14.4, 0) projected
  line L1 (15.9, 0) -> (15.9, 12)
  line L2 (15.9, 12) -> (24.3, 12)
  line L3 (15.9, 12) -> (24.3, 12) construction
  line L4 (24.3, 12) -> (7.5, 12)
  line L5 (7.5, 12) -> (7.5, 8.2)
  line L6 (7.5, 8.2) -> (24.3, 8.2)
  line L7 (24.3, 8.2) -> (24.3, 12)
  point P0 (0, 0)
  dimension "d48" = 12
  dimension "d49" = 8.4
  dimension "d50" = 0
  dimension "d51" = 16.8
  dimension "d52" = 3.8
extrude "Extrusion4" cut sketch "Sketch4" against normal blind 6
sketch3d "3D Sketch1"
ref_plane "Work Plane1" through (0, 22.2, -30.8) normal (-0.6571, -0.3693, 0.6571) x (-0.7071, 0, -0.7071)
sketch "Sketch5" plane through (0, 22.2, -30.8) normal (-0.6571, -0.3693, 0.6571) x (-0.7071, 0, -0.7071)
  line L0 (-21.7789, -8.0435) -> (5.4447, 2.0109) projected
  line L1 (-3.5227, -1.301) -> (16.1237, -1.301)
  line L2 (16.1237, -1.301) -> (16.1237, 19.91)
  line L3 (16.1237, 19.91) -> (-3.5227, 19.91)
  line L4 (-3.5227, 19.91) -> (-3.5227, -1.301)
  point P0 (-21.7789, 12.5869)
extrude "Extrusion5" cut sketch "Sketch5" against normal blind 6
ref_plane "Work Plane2" through (-15.9, 0, -38.5) normal (-1, 0, 0) x (0, 0, 1)
mirror "Mirror1" about plane through (-15.9, 0, -38.5) normal (-1, 0, 0) of "Extrusion5"
properties part number "Contactile Sensor"
